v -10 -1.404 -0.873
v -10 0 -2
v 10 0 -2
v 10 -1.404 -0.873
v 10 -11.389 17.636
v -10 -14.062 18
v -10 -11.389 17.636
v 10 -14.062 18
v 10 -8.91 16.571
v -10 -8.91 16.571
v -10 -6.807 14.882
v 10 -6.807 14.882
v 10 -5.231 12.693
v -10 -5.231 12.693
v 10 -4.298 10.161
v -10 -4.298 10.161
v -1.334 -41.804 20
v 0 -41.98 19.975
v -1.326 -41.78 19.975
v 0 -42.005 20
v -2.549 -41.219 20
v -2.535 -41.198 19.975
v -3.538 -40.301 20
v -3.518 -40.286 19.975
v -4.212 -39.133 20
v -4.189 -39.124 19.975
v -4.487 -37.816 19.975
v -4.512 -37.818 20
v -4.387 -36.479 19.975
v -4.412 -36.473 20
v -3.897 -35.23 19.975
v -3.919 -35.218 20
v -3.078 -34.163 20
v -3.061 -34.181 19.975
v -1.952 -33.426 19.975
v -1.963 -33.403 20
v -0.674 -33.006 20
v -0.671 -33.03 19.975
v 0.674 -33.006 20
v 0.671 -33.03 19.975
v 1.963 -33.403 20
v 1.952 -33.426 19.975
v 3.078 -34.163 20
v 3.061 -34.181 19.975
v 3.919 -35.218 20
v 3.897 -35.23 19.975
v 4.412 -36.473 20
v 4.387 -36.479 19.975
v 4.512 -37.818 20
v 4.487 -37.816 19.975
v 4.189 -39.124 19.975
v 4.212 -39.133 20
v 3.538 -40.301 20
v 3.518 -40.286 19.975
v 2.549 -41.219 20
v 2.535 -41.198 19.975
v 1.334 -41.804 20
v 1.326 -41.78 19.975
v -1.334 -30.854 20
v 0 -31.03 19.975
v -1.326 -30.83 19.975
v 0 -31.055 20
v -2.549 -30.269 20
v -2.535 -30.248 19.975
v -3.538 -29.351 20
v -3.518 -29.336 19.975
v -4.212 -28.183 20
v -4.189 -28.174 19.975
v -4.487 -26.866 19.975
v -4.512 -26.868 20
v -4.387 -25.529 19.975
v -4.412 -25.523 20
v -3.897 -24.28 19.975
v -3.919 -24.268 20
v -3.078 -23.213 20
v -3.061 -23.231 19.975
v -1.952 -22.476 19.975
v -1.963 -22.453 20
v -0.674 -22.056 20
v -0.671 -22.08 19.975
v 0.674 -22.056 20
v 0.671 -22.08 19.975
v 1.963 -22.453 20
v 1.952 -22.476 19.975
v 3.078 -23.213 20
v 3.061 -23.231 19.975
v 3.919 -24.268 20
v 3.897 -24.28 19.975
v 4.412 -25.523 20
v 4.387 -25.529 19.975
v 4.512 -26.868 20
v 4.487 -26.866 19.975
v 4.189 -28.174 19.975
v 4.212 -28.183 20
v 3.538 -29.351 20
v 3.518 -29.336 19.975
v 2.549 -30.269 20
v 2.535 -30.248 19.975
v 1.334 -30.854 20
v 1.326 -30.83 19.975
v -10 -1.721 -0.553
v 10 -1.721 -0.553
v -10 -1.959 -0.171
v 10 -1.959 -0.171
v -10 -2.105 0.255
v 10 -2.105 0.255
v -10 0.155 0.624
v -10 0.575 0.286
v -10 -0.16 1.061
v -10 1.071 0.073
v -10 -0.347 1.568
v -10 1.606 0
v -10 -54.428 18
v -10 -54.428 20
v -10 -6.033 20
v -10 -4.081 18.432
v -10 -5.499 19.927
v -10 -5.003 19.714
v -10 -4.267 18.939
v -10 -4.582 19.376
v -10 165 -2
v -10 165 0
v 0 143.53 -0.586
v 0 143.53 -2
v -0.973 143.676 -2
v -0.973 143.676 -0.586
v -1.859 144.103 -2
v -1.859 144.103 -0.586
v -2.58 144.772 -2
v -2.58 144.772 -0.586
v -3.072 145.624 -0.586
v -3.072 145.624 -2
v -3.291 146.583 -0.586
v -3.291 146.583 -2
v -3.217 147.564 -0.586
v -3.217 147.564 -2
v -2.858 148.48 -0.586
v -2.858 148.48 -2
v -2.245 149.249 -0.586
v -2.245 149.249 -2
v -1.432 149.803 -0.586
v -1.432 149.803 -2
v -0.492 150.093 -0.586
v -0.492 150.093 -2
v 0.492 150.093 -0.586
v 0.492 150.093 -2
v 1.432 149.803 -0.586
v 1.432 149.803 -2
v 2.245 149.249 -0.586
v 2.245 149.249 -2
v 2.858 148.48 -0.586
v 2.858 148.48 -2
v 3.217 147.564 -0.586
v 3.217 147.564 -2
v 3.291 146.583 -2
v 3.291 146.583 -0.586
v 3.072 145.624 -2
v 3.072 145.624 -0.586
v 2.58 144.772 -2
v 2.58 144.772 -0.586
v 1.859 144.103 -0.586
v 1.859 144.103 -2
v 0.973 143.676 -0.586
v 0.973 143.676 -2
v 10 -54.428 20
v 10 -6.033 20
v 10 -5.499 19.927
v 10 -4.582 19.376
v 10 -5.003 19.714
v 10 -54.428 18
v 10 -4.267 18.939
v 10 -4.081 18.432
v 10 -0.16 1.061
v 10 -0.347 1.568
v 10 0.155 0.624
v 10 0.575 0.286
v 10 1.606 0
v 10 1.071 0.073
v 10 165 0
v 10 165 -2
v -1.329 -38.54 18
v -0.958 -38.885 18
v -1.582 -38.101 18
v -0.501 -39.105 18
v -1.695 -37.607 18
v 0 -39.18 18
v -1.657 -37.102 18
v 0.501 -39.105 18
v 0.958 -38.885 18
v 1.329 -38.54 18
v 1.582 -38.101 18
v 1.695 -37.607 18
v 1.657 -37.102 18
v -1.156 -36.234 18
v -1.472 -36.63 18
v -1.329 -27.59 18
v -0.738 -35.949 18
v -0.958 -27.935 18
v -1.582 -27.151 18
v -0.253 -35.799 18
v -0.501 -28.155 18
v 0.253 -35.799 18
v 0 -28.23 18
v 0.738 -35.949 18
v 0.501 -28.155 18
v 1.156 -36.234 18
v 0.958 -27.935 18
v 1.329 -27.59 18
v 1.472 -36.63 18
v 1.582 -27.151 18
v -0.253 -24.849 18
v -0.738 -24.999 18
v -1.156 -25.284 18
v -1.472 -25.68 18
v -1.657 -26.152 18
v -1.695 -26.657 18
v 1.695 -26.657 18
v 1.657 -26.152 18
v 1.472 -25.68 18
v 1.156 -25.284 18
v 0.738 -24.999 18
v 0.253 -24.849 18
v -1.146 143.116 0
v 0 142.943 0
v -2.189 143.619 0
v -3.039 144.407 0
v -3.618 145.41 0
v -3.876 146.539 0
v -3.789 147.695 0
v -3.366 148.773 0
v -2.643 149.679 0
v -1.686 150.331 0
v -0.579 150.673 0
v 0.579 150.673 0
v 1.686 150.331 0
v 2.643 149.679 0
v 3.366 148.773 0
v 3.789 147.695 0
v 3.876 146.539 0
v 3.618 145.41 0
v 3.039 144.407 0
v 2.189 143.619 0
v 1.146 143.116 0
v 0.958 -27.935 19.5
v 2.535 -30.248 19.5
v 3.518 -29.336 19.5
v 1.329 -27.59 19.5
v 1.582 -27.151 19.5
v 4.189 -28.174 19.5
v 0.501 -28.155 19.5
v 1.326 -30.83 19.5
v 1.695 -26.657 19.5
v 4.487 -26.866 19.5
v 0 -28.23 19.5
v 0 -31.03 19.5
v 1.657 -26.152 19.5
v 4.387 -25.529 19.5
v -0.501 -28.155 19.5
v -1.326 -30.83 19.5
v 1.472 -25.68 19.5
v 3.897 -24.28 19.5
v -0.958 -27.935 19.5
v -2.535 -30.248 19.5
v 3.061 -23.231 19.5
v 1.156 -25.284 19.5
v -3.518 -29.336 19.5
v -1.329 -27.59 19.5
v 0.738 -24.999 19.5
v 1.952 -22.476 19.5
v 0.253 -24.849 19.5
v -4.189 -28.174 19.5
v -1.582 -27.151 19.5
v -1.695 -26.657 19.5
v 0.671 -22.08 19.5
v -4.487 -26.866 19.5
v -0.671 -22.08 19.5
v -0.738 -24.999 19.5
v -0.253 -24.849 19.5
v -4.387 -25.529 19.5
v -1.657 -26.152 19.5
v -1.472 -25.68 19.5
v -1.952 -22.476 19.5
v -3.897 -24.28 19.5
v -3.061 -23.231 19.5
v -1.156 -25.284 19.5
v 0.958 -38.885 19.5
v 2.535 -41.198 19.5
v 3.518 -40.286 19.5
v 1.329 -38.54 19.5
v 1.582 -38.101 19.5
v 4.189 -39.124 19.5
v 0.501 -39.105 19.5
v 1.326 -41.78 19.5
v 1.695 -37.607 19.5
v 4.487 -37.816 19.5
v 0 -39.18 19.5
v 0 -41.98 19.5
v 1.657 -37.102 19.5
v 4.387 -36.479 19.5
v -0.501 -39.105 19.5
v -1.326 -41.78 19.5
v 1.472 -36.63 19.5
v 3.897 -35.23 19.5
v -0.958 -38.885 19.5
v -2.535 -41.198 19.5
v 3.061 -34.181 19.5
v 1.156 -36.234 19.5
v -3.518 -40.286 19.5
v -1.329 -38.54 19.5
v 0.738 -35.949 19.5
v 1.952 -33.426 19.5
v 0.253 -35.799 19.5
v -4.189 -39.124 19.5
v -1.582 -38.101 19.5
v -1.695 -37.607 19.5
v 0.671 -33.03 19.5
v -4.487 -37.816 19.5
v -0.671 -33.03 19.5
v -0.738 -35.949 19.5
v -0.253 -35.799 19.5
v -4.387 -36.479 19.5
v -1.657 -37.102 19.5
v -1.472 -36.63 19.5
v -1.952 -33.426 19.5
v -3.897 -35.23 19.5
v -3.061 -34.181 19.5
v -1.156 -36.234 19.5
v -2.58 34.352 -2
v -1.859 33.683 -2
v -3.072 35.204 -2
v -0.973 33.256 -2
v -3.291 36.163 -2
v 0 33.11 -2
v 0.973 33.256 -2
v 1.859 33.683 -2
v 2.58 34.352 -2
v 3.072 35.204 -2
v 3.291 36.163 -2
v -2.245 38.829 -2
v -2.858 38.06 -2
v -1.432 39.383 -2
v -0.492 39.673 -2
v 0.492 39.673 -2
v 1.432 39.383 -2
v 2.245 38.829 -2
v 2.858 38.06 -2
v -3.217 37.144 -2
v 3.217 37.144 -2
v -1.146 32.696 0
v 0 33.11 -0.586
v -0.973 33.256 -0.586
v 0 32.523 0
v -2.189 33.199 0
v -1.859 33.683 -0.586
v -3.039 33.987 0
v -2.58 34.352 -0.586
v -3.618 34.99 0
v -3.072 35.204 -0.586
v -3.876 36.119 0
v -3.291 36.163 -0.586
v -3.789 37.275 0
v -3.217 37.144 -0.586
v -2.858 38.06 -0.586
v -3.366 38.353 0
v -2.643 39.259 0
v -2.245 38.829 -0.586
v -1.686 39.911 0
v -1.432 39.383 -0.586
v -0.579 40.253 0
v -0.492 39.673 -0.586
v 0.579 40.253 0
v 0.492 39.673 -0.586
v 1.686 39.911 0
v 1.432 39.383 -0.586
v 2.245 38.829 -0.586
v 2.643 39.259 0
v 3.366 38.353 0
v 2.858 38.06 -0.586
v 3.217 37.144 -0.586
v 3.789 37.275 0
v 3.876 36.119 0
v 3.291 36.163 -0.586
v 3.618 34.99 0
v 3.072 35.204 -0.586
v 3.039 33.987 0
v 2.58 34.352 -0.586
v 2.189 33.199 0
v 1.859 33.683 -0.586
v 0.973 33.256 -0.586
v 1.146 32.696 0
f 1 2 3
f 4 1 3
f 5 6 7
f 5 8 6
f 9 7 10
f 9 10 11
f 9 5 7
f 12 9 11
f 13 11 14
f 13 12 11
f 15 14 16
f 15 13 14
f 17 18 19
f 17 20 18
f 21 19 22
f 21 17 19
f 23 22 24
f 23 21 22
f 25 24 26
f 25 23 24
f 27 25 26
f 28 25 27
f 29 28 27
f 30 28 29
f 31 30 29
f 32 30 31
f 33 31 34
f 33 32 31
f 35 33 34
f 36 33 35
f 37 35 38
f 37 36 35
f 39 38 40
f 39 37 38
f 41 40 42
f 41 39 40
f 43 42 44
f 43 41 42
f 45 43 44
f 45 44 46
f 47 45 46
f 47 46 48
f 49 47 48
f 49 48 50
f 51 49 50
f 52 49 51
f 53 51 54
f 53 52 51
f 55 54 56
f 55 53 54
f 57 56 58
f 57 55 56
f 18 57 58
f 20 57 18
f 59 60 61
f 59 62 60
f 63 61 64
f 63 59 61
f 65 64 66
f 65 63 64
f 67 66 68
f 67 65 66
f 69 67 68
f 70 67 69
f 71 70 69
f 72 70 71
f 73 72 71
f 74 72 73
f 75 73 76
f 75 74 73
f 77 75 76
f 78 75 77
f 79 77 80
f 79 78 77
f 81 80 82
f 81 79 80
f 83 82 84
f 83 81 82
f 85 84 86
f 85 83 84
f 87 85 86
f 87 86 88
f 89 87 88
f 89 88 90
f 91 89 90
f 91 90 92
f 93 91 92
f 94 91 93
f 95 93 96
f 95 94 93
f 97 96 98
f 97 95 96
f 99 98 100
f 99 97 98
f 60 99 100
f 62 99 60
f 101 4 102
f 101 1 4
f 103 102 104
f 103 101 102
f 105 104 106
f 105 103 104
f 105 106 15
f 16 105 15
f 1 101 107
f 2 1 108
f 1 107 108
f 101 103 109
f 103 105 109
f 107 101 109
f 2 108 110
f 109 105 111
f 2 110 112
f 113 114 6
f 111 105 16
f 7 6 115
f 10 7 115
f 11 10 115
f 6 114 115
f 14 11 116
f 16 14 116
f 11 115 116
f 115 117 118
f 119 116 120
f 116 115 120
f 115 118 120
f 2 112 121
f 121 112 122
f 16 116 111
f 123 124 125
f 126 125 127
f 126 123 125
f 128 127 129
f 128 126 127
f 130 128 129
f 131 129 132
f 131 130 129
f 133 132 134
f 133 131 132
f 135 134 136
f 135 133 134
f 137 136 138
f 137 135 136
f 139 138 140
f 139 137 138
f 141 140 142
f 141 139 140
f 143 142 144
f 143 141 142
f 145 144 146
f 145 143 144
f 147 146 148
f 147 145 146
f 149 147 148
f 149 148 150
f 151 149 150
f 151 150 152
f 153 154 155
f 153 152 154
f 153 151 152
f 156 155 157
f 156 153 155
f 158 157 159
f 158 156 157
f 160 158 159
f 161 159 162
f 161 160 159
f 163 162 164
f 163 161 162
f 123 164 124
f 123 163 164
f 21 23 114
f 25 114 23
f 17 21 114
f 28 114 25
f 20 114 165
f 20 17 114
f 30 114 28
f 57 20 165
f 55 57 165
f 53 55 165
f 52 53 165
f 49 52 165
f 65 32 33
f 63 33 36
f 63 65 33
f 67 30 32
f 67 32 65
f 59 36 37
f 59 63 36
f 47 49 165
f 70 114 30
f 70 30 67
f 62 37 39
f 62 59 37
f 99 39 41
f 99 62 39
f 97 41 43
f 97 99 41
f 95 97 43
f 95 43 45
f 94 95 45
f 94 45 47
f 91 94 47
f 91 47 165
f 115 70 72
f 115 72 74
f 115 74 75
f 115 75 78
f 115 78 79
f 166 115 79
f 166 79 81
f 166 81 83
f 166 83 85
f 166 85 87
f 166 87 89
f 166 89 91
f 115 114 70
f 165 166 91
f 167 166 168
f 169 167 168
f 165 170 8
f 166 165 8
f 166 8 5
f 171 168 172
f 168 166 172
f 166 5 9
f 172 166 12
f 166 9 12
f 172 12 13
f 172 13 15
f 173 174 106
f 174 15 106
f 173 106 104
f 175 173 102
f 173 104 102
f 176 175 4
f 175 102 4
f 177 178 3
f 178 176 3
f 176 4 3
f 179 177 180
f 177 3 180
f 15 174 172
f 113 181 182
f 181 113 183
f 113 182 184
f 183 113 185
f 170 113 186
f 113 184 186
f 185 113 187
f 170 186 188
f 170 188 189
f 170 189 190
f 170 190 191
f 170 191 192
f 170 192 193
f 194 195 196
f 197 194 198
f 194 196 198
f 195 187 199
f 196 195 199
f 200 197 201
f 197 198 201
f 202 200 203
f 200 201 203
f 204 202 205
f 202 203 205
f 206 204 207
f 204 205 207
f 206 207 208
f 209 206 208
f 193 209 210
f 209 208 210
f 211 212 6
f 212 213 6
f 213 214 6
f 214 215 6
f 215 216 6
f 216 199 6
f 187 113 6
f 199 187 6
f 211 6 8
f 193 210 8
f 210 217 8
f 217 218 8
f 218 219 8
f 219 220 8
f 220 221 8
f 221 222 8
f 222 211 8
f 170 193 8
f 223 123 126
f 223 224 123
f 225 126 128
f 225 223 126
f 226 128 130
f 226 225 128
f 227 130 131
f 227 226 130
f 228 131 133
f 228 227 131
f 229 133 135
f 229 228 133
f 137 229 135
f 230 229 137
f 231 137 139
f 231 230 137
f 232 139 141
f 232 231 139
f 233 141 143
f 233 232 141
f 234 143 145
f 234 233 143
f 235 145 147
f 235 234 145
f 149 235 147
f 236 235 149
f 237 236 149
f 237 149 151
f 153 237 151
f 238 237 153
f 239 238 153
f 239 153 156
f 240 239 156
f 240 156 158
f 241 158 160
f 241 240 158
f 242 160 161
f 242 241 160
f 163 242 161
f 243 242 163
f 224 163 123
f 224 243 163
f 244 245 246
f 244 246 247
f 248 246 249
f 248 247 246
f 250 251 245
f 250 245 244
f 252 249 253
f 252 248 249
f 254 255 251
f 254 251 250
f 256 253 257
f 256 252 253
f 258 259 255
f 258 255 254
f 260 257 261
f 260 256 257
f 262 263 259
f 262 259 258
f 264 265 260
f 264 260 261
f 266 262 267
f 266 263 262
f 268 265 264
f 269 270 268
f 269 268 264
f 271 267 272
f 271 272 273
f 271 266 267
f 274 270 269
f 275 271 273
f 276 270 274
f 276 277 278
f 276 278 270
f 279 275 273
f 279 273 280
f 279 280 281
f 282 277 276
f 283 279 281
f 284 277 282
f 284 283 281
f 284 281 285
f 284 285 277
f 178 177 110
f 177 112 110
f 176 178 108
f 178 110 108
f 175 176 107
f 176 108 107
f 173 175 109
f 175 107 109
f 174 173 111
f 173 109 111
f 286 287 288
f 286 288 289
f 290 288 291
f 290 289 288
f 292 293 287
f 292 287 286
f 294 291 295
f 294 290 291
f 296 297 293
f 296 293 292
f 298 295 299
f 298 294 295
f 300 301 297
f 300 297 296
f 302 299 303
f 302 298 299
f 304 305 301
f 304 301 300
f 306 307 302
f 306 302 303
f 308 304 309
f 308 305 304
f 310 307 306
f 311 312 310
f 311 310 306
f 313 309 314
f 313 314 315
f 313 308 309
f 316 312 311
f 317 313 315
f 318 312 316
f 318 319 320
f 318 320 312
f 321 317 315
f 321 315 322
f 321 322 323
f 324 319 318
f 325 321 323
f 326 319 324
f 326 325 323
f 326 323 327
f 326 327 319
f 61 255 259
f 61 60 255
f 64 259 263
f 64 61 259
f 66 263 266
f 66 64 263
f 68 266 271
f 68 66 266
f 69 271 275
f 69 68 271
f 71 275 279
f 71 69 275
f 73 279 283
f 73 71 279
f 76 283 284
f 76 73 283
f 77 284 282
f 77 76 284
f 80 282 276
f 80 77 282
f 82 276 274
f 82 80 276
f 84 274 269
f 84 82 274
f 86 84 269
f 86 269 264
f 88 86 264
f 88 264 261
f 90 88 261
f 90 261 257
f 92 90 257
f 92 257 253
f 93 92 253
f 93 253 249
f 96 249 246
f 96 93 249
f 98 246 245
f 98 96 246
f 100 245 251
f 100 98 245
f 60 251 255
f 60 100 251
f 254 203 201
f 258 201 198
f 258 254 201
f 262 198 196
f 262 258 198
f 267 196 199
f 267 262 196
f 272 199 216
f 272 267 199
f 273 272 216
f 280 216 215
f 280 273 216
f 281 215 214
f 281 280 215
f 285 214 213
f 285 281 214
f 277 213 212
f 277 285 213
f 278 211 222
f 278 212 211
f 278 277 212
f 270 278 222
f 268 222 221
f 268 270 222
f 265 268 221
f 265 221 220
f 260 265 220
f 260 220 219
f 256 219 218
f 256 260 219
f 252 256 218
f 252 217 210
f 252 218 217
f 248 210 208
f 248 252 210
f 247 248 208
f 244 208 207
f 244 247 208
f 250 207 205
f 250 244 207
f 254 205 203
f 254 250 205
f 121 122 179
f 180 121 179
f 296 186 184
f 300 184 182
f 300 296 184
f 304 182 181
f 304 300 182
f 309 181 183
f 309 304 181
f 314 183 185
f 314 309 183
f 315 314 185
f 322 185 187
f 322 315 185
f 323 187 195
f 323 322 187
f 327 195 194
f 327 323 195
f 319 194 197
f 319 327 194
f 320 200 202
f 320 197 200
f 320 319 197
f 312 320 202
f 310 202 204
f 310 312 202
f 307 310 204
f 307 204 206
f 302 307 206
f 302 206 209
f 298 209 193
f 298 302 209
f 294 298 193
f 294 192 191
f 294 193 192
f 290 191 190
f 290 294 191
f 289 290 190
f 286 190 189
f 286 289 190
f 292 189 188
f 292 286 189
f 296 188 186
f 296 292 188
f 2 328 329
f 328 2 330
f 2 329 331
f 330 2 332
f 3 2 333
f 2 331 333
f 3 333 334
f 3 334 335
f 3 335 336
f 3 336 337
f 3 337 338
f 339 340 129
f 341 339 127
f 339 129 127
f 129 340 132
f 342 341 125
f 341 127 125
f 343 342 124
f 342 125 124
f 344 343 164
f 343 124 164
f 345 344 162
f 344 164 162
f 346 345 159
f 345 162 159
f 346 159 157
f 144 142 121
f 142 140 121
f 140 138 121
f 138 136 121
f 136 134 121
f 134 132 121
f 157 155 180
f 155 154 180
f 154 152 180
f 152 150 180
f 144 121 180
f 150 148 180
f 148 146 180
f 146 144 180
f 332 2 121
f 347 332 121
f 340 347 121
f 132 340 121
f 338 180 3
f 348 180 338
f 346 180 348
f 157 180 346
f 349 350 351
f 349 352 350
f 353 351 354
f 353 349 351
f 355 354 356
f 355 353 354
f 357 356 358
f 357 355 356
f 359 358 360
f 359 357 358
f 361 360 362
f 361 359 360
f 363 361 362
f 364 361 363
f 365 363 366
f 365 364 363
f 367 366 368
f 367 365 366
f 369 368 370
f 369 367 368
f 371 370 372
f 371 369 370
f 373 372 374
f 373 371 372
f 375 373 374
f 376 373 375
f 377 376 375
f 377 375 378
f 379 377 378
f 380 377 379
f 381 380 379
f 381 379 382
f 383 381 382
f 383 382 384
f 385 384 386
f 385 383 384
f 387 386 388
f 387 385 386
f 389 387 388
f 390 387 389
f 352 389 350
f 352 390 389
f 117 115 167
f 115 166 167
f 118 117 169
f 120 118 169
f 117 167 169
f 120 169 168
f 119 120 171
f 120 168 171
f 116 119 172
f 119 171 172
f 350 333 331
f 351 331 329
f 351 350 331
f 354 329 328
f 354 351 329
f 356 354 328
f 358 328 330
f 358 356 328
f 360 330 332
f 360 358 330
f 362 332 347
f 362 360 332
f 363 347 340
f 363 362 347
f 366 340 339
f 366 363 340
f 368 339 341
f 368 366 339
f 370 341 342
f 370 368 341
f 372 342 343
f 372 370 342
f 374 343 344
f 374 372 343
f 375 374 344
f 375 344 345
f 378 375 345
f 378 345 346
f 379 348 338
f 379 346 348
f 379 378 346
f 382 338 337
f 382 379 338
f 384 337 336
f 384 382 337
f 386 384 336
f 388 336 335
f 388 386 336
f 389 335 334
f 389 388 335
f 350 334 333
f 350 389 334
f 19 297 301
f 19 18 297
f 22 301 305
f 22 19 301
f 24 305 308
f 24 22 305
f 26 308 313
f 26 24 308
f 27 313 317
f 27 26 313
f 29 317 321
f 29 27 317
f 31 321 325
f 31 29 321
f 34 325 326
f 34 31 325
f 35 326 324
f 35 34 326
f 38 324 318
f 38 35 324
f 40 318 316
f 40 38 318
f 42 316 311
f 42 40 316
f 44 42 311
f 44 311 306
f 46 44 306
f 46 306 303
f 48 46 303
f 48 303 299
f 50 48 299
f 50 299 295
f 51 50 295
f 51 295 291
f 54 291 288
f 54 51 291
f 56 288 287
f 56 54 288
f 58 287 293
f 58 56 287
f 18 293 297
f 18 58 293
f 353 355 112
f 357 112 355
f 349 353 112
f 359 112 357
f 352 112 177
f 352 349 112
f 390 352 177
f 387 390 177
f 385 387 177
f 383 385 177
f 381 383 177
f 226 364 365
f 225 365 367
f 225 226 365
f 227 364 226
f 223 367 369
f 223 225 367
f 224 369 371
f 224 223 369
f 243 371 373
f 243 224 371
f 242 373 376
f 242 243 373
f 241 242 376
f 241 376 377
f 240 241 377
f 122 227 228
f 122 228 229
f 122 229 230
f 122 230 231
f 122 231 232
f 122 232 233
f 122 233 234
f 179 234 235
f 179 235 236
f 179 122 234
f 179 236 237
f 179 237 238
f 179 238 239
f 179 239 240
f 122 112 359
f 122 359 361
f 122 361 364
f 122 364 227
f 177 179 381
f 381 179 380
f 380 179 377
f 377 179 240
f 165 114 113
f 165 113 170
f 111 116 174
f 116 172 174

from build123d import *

# Parameters (mm, degrees)
ESTRUSIONE_SOTTILE1_DEPTH                    = 10
SCHIZZO4_W                                   = 20
SCHIZZO4_H                                   = 50
ESTRUSIONE_ESTRUSIONE1_DEPTH                 = 2
SCHIZZO1_W                                   = 20
SCHIZZO1_H                                   = 165
ESTRUSIONE_ESTRUSIONE2_DEPTH                 = 2
RACCORDO2_R                                  = 10
RACCORDO8_R                                  = 2
LOFT3_START                                  = -1.559581264
LOFT3_OUTLINE_W                              = 20
LOFT3_OUTLINE_H                              = 2.50416156
LOFT3_DEPTH                                  = 1.559581264
RACCORDO13_R                                 = 2
RACCORDO14_R                                 = 2
FORO_FILETTATO_G1_16_2_AT_2_COUNT            = 2
FORO_FILETTATO_G1_16_2_AT_2_PITCH            = 110.419904734
FORO_LAMATO_PER_BULLONE_M3_A_TESTA_E_2_COUNT = 2
FORO_LAMATO_PER_BULLONE_M3_A_TESTA_E_2_PITCH = 10.95


with BuildPart() as part:
    # Schizzo5 → Estrusione-Sottile1 (new, symmetric)
    with BuildSketch(Plane(origin=(0, 0, 0), x_dir=(0, 0, -1), z_dir=(1, 0, 0))):
        Polygon((-20, -4.427601882), (0, 0), (0.43229372, -1.952721726), (-19.56770628, -6.380323609), align=None)
    extrude(amount=ESTRUSIONE_SOTTILE1_DEPTH, both=True)

    # Schizzo4 → Estrusione-Estrusione1 (add)
    with BuildSketch(Plane.XY.offset(20)):
        with Locations((0, -29.427601882)):
            Rectangle(SCHIZZO4_W, SCHIZZO4_H)
    extrude(amount=-ESTRUSIONE_ESTRUSIONE1_DEPTH)

    # Raccordo2
    raccordo2_edges = [part.edges().sort_by_distance(p)[0] for p in [
        (0, -6.033264645, 18),
    ]]
    fillet(raccordo2_edges, radius=RACCORDO2_R)

    # Raccordo8
    raccordo8_edges = [part.edges().sort_by_distance(p)[0] for p in [
        (0, -4.427601882, 20),
    ]]
    fillet(raccordo8_edges, radius=RACCORDO8_R)



with BuildPart() as body_2:
    # Schizzo1 → Estrusione-Estrusione2 (new body)
    with BuildSketch(Plane.XY):
        with Locations((0, 82.5)):
            Rectangle(SCHIZZO1_W, SCHIZZO1_H)
    extrude(amount=-ESTRUSIONE_ESTRUSIONE2_DEPTH)


with BuildPart() as part_1:
    add(part.part)

    add(body_2.part)  # Loft3 merges body 2
    # Loft3: read off the stored shape, not the designer's step
    # Loft3 outline → Loft3 (add)
    with BuildSketch(Plane(origin=(0, 0, 0), x_dir=(1, 0, 0), z_dir=(0, 0.626040390160855, 0.779790632084821)).offset(LOFT3_START)):
        Rectangle(LOFT3_OUTLINE_W, LOFT3_OUTLINE_H)
    extrude(amount=LOFT3_DEPTH)

    # Raccordo13
    raccordo13_edges = [part_1.edges().sort_by_distance(p)[0] for p in [
        (0, -1.952721726, -0.43229372),
    ]]
    fillet(raccordo13_edges, radius=RACCORDO13_R)

    # Raccordo14
    raccordo14_edges = [part_1.edges().sort_by_distance(p)[0] for p in [
        (0, 0, 0),
    ]]
    fillet(raccordo14_edges, radius=RACCORDO14_R)

    # Schizzo11 → Foro filettato G1/16-2 (revolve, cut)
    with BuildSketch(Plane(origin=(0, 146.829705844, 0), x_dir=(0, -1, 0), z_dir=(1, 0, 0))):
        Polygon((0, 0), (0, 2.005), (3.3, 2.005), (3.3, 0.5865), (3.8865, 0), align=None)
    foro_filettato_g1_16_2 = revolve(axis=Axis((0, 146.829705844, 6.35), (0, 0, -1)), mode=Mode.SUBTRACT)

    # Foro filettato G1/16-2 at 2: Foro filettato G1/16-2 ×2
    with Locations(*[(0, -i * FORO_FILETTATO_G1_16_2_AT_2_PITCH, 0) for i in range(1, FORO_FILETTATO_G1_16_2_AT_2_COUNT)]):
        add(foro_filettato_g1_16_2, mode=Mode.SUBTRACT)

    # Schizzo27 → Foro lamato per Bullone M3 a testa esagonale-4 (revolve, cut)
    with BuildSketch(Plane(origin=(0, -26.530198891, 20), x_dir=(0, -1, 0), z_dir=(1, 0, 0))):
        Polygon((0, 0), (0, 22.005), (1.7, 22.005), (1.7, 0.5), (4.5, 0.5), (4.5, 0.025), (4.525, 0), align=None)
    foro_lamato_per_bullone_m3_a_testa_esago = revolve(axis=Axis((0, -26.530198891, 26.35), (0, 0, -1)), mode=Mode.SUBTRACT)

    # Foro lamato per Bullone M3 a testa e 2: Foro lamato per Bullone M3 a testa esagonale-4 ×2
    with Locations(*[(0, -i * FORO_LAMATO_PER_BULLONE_M3_A_TESTA_E_2_PITCH, 0) for i in range(1, FORO_LAMATO_PER_BULLONE_M3_A_TESTA_E_2_COUNT)]):
        add(foro_lamato_per_bullone_m3_a_testa_esago, mode=Mode.SUBTRACT)


solid = part_1.part
